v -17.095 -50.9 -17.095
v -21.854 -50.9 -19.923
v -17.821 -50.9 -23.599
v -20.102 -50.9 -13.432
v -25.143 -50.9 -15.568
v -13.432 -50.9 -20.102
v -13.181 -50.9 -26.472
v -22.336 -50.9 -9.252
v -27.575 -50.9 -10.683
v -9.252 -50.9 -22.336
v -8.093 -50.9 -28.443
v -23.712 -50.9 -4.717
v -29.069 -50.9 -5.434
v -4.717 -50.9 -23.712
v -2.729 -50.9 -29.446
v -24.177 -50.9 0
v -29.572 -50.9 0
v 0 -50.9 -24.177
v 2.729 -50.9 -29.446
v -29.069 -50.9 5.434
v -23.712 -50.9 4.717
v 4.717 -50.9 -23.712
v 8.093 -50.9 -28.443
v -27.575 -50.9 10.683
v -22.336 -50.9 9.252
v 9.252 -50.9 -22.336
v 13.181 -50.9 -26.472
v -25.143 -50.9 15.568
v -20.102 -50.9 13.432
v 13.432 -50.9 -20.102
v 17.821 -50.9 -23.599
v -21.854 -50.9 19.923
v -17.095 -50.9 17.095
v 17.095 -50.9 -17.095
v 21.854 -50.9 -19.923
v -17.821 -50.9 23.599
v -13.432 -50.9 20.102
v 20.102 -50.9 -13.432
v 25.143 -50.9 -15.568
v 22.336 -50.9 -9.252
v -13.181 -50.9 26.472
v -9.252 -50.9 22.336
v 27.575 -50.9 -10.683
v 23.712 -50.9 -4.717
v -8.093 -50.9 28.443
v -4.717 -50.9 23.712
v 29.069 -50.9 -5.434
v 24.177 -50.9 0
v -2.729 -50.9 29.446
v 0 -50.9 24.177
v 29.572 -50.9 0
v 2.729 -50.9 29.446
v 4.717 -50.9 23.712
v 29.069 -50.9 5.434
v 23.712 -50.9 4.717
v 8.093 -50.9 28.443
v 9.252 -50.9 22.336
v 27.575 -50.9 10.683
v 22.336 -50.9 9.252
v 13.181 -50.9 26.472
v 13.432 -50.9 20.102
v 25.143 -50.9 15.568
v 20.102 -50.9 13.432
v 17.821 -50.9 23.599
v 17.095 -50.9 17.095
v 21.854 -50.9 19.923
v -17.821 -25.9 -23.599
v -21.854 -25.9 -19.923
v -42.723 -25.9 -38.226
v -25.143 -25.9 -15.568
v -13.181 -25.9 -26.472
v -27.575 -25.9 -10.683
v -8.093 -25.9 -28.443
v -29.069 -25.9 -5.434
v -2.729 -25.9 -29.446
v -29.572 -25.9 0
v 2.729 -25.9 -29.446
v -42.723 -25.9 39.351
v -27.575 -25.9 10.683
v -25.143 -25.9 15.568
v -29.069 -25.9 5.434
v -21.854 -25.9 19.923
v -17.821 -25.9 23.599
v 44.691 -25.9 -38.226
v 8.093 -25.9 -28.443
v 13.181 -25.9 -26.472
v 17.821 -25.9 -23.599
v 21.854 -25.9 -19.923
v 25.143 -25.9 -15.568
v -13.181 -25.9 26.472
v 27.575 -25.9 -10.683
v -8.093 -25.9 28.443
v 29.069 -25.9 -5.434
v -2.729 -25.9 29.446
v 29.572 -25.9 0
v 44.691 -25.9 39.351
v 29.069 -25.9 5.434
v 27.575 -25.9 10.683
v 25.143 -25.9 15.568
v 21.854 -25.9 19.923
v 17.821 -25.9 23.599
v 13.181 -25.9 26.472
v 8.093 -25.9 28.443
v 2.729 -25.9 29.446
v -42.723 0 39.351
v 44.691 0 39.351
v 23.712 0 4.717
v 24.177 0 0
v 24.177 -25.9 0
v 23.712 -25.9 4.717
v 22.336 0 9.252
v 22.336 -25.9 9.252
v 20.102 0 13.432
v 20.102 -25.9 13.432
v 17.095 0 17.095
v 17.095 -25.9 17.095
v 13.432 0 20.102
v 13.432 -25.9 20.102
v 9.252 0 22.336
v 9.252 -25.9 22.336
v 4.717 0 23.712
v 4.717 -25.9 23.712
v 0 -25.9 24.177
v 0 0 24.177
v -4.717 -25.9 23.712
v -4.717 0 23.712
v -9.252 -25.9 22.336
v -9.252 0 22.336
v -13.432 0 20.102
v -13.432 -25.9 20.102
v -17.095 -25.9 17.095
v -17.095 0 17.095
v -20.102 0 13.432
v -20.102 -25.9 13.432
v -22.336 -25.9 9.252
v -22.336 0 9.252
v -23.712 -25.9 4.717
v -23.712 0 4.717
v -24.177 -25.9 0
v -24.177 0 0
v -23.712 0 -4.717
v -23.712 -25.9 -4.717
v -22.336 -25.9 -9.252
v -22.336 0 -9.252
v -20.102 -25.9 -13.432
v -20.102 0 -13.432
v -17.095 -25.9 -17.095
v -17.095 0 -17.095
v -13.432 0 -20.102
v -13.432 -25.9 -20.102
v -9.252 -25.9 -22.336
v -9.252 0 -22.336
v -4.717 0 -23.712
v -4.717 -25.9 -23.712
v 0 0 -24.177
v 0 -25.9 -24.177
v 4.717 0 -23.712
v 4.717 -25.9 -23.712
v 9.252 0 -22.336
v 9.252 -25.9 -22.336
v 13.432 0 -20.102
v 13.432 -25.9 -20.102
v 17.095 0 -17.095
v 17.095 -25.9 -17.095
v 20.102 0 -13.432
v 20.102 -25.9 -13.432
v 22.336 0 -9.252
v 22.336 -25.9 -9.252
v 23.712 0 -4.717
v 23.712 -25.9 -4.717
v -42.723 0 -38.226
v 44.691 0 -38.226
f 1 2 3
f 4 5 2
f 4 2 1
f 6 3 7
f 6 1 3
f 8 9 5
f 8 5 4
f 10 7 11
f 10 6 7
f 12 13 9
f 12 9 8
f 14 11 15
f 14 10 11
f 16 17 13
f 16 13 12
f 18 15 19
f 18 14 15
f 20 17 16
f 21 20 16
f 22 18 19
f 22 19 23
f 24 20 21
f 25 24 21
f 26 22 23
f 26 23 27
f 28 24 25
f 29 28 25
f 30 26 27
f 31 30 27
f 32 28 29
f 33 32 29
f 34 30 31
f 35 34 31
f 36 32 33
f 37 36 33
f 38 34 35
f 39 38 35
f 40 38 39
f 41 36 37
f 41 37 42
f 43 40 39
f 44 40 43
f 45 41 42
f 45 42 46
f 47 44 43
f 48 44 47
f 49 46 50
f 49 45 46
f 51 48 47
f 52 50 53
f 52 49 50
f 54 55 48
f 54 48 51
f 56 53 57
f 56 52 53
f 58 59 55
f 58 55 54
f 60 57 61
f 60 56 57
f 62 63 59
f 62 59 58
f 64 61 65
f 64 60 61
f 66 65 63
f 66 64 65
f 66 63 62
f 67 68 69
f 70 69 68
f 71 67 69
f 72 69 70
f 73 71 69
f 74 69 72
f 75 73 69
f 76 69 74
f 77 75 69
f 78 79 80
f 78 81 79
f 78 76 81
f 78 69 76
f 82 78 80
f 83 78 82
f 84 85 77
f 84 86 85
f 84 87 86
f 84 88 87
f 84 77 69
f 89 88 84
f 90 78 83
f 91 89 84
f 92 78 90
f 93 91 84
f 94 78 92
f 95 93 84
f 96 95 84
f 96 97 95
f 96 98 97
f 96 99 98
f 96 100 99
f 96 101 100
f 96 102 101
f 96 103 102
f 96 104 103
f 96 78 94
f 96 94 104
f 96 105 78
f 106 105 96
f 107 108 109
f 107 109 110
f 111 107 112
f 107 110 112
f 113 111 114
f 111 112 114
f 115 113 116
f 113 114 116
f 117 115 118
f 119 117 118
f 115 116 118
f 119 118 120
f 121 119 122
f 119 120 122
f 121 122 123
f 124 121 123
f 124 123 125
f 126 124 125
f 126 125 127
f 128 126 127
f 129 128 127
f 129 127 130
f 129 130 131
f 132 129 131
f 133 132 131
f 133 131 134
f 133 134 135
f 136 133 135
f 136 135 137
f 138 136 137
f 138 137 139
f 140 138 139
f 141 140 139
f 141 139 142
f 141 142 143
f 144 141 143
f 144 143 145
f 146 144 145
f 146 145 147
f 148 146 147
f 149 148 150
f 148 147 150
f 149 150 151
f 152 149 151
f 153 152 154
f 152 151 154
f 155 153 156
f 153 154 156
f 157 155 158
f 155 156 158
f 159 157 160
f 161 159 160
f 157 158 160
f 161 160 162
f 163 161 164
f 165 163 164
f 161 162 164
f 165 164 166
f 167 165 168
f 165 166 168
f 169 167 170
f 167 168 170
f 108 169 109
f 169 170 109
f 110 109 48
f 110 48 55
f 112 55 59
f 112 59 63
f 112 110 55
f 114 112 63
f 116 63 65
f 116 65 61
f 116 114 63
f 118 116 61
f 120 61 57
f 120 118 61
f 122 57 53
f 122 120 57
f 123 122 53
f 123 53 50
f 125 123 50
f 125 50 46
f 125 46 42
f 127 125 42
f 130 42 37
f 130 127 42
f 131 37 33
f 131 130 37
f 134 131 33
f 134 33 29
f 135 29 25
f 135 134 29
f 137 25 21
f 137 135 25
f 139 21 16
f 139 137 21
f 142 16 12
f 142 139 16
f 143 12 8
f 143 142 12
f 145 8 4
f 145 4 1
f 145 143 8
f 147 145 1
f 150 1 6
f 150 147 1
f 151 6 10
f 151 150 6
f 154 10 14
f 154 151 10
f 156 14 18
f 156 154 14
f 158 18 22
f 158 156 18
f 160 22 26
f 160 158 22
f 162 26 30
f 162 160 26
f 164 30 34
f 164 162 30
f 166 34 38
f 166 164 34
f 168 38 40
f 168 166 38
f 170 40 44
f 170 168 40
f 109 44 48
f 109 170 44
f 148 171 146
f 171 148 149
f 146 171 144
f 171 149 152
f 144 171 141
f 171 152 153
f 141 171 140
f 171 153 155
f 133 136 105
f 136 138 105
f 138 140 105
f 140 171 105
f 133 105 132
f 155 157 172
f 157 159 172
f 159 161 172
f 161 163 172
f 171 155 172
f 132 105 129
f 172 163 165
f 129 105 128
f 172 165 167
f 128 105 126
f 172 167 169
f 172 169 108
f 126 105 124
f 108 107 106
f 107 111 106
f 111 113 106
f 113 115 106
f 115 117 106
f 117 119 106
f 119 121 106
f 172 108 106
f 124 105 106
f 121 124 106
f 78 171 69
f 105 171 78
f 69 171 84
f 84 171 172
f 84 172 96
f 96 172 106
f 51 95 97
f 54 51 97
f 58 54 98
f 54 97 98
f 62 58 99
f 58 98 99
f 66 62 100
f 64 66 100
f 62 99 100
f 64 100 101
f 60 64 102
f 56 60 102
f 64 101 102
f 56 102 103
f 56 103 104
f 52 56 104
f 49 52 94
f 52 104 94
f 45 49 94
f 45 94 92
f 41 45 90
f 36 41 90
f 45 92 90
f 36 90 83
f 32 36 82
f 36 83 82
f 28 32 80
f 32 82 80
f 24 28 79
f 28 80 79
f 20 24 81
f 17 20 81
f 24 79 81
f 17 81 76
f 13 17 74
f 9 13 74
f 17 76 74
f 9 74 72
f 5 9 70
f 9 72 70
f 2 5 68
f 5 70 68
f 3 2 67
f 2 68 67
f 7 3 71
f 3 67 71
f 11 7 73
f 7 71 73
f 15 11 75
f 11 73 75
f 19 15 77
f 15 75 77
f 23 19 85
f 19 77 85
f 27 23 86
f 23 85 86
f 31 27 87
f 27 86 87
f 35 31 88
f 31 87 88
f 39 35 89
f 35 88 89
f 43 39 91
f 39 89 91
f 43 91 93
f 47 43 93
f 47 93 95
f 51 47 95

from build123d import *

# Parameters (mm, degrees)
F0_W     = 87.414469
F0_H     = 77.576831
F1_DEPTH = 25.9
F2_R     = 29.572162
F2_R_2   = 24.176686
F3_DEPTH = 25
F4_DEPTH = 41.6
F5_DEPTH = 58.3


with BuildPart() as f1:
    # F0 (on Front) → F1 (new body)
    with BuildSketch(Plane.XZ):
        with Locations((0.983765, 0.562154)):
            Rectangle(F0_W, F0_H)
    extrude(amount=F1_DEPTH)

    # F2 (on face) → F3 (join)
    with BuildSketch(Plane.XZ.offset(25.9)):
        Circle(F2_R)
        Circle(F2_R_2, mode=Mode.SUBTRACT)
    extrude(amount=F3_DEPTH)

    # F2 (on face) → F4 (cut)
    with BuildSketch(Plane.XZ.offset(25.9)):
        Circle(F2_R_2)
    extrude(amount=-F4_DEPTH, mode=Mode.SUBTRACT)

    # F2 (on face) → F5 (cut)
    with BuildSketch(Plane.XZ.offset(25.9)):
        Circle(F2_R_2)
    extrude(amount=-F5_DEPTH, mode=Mode.SUBTRACT)


solid = f1.part
